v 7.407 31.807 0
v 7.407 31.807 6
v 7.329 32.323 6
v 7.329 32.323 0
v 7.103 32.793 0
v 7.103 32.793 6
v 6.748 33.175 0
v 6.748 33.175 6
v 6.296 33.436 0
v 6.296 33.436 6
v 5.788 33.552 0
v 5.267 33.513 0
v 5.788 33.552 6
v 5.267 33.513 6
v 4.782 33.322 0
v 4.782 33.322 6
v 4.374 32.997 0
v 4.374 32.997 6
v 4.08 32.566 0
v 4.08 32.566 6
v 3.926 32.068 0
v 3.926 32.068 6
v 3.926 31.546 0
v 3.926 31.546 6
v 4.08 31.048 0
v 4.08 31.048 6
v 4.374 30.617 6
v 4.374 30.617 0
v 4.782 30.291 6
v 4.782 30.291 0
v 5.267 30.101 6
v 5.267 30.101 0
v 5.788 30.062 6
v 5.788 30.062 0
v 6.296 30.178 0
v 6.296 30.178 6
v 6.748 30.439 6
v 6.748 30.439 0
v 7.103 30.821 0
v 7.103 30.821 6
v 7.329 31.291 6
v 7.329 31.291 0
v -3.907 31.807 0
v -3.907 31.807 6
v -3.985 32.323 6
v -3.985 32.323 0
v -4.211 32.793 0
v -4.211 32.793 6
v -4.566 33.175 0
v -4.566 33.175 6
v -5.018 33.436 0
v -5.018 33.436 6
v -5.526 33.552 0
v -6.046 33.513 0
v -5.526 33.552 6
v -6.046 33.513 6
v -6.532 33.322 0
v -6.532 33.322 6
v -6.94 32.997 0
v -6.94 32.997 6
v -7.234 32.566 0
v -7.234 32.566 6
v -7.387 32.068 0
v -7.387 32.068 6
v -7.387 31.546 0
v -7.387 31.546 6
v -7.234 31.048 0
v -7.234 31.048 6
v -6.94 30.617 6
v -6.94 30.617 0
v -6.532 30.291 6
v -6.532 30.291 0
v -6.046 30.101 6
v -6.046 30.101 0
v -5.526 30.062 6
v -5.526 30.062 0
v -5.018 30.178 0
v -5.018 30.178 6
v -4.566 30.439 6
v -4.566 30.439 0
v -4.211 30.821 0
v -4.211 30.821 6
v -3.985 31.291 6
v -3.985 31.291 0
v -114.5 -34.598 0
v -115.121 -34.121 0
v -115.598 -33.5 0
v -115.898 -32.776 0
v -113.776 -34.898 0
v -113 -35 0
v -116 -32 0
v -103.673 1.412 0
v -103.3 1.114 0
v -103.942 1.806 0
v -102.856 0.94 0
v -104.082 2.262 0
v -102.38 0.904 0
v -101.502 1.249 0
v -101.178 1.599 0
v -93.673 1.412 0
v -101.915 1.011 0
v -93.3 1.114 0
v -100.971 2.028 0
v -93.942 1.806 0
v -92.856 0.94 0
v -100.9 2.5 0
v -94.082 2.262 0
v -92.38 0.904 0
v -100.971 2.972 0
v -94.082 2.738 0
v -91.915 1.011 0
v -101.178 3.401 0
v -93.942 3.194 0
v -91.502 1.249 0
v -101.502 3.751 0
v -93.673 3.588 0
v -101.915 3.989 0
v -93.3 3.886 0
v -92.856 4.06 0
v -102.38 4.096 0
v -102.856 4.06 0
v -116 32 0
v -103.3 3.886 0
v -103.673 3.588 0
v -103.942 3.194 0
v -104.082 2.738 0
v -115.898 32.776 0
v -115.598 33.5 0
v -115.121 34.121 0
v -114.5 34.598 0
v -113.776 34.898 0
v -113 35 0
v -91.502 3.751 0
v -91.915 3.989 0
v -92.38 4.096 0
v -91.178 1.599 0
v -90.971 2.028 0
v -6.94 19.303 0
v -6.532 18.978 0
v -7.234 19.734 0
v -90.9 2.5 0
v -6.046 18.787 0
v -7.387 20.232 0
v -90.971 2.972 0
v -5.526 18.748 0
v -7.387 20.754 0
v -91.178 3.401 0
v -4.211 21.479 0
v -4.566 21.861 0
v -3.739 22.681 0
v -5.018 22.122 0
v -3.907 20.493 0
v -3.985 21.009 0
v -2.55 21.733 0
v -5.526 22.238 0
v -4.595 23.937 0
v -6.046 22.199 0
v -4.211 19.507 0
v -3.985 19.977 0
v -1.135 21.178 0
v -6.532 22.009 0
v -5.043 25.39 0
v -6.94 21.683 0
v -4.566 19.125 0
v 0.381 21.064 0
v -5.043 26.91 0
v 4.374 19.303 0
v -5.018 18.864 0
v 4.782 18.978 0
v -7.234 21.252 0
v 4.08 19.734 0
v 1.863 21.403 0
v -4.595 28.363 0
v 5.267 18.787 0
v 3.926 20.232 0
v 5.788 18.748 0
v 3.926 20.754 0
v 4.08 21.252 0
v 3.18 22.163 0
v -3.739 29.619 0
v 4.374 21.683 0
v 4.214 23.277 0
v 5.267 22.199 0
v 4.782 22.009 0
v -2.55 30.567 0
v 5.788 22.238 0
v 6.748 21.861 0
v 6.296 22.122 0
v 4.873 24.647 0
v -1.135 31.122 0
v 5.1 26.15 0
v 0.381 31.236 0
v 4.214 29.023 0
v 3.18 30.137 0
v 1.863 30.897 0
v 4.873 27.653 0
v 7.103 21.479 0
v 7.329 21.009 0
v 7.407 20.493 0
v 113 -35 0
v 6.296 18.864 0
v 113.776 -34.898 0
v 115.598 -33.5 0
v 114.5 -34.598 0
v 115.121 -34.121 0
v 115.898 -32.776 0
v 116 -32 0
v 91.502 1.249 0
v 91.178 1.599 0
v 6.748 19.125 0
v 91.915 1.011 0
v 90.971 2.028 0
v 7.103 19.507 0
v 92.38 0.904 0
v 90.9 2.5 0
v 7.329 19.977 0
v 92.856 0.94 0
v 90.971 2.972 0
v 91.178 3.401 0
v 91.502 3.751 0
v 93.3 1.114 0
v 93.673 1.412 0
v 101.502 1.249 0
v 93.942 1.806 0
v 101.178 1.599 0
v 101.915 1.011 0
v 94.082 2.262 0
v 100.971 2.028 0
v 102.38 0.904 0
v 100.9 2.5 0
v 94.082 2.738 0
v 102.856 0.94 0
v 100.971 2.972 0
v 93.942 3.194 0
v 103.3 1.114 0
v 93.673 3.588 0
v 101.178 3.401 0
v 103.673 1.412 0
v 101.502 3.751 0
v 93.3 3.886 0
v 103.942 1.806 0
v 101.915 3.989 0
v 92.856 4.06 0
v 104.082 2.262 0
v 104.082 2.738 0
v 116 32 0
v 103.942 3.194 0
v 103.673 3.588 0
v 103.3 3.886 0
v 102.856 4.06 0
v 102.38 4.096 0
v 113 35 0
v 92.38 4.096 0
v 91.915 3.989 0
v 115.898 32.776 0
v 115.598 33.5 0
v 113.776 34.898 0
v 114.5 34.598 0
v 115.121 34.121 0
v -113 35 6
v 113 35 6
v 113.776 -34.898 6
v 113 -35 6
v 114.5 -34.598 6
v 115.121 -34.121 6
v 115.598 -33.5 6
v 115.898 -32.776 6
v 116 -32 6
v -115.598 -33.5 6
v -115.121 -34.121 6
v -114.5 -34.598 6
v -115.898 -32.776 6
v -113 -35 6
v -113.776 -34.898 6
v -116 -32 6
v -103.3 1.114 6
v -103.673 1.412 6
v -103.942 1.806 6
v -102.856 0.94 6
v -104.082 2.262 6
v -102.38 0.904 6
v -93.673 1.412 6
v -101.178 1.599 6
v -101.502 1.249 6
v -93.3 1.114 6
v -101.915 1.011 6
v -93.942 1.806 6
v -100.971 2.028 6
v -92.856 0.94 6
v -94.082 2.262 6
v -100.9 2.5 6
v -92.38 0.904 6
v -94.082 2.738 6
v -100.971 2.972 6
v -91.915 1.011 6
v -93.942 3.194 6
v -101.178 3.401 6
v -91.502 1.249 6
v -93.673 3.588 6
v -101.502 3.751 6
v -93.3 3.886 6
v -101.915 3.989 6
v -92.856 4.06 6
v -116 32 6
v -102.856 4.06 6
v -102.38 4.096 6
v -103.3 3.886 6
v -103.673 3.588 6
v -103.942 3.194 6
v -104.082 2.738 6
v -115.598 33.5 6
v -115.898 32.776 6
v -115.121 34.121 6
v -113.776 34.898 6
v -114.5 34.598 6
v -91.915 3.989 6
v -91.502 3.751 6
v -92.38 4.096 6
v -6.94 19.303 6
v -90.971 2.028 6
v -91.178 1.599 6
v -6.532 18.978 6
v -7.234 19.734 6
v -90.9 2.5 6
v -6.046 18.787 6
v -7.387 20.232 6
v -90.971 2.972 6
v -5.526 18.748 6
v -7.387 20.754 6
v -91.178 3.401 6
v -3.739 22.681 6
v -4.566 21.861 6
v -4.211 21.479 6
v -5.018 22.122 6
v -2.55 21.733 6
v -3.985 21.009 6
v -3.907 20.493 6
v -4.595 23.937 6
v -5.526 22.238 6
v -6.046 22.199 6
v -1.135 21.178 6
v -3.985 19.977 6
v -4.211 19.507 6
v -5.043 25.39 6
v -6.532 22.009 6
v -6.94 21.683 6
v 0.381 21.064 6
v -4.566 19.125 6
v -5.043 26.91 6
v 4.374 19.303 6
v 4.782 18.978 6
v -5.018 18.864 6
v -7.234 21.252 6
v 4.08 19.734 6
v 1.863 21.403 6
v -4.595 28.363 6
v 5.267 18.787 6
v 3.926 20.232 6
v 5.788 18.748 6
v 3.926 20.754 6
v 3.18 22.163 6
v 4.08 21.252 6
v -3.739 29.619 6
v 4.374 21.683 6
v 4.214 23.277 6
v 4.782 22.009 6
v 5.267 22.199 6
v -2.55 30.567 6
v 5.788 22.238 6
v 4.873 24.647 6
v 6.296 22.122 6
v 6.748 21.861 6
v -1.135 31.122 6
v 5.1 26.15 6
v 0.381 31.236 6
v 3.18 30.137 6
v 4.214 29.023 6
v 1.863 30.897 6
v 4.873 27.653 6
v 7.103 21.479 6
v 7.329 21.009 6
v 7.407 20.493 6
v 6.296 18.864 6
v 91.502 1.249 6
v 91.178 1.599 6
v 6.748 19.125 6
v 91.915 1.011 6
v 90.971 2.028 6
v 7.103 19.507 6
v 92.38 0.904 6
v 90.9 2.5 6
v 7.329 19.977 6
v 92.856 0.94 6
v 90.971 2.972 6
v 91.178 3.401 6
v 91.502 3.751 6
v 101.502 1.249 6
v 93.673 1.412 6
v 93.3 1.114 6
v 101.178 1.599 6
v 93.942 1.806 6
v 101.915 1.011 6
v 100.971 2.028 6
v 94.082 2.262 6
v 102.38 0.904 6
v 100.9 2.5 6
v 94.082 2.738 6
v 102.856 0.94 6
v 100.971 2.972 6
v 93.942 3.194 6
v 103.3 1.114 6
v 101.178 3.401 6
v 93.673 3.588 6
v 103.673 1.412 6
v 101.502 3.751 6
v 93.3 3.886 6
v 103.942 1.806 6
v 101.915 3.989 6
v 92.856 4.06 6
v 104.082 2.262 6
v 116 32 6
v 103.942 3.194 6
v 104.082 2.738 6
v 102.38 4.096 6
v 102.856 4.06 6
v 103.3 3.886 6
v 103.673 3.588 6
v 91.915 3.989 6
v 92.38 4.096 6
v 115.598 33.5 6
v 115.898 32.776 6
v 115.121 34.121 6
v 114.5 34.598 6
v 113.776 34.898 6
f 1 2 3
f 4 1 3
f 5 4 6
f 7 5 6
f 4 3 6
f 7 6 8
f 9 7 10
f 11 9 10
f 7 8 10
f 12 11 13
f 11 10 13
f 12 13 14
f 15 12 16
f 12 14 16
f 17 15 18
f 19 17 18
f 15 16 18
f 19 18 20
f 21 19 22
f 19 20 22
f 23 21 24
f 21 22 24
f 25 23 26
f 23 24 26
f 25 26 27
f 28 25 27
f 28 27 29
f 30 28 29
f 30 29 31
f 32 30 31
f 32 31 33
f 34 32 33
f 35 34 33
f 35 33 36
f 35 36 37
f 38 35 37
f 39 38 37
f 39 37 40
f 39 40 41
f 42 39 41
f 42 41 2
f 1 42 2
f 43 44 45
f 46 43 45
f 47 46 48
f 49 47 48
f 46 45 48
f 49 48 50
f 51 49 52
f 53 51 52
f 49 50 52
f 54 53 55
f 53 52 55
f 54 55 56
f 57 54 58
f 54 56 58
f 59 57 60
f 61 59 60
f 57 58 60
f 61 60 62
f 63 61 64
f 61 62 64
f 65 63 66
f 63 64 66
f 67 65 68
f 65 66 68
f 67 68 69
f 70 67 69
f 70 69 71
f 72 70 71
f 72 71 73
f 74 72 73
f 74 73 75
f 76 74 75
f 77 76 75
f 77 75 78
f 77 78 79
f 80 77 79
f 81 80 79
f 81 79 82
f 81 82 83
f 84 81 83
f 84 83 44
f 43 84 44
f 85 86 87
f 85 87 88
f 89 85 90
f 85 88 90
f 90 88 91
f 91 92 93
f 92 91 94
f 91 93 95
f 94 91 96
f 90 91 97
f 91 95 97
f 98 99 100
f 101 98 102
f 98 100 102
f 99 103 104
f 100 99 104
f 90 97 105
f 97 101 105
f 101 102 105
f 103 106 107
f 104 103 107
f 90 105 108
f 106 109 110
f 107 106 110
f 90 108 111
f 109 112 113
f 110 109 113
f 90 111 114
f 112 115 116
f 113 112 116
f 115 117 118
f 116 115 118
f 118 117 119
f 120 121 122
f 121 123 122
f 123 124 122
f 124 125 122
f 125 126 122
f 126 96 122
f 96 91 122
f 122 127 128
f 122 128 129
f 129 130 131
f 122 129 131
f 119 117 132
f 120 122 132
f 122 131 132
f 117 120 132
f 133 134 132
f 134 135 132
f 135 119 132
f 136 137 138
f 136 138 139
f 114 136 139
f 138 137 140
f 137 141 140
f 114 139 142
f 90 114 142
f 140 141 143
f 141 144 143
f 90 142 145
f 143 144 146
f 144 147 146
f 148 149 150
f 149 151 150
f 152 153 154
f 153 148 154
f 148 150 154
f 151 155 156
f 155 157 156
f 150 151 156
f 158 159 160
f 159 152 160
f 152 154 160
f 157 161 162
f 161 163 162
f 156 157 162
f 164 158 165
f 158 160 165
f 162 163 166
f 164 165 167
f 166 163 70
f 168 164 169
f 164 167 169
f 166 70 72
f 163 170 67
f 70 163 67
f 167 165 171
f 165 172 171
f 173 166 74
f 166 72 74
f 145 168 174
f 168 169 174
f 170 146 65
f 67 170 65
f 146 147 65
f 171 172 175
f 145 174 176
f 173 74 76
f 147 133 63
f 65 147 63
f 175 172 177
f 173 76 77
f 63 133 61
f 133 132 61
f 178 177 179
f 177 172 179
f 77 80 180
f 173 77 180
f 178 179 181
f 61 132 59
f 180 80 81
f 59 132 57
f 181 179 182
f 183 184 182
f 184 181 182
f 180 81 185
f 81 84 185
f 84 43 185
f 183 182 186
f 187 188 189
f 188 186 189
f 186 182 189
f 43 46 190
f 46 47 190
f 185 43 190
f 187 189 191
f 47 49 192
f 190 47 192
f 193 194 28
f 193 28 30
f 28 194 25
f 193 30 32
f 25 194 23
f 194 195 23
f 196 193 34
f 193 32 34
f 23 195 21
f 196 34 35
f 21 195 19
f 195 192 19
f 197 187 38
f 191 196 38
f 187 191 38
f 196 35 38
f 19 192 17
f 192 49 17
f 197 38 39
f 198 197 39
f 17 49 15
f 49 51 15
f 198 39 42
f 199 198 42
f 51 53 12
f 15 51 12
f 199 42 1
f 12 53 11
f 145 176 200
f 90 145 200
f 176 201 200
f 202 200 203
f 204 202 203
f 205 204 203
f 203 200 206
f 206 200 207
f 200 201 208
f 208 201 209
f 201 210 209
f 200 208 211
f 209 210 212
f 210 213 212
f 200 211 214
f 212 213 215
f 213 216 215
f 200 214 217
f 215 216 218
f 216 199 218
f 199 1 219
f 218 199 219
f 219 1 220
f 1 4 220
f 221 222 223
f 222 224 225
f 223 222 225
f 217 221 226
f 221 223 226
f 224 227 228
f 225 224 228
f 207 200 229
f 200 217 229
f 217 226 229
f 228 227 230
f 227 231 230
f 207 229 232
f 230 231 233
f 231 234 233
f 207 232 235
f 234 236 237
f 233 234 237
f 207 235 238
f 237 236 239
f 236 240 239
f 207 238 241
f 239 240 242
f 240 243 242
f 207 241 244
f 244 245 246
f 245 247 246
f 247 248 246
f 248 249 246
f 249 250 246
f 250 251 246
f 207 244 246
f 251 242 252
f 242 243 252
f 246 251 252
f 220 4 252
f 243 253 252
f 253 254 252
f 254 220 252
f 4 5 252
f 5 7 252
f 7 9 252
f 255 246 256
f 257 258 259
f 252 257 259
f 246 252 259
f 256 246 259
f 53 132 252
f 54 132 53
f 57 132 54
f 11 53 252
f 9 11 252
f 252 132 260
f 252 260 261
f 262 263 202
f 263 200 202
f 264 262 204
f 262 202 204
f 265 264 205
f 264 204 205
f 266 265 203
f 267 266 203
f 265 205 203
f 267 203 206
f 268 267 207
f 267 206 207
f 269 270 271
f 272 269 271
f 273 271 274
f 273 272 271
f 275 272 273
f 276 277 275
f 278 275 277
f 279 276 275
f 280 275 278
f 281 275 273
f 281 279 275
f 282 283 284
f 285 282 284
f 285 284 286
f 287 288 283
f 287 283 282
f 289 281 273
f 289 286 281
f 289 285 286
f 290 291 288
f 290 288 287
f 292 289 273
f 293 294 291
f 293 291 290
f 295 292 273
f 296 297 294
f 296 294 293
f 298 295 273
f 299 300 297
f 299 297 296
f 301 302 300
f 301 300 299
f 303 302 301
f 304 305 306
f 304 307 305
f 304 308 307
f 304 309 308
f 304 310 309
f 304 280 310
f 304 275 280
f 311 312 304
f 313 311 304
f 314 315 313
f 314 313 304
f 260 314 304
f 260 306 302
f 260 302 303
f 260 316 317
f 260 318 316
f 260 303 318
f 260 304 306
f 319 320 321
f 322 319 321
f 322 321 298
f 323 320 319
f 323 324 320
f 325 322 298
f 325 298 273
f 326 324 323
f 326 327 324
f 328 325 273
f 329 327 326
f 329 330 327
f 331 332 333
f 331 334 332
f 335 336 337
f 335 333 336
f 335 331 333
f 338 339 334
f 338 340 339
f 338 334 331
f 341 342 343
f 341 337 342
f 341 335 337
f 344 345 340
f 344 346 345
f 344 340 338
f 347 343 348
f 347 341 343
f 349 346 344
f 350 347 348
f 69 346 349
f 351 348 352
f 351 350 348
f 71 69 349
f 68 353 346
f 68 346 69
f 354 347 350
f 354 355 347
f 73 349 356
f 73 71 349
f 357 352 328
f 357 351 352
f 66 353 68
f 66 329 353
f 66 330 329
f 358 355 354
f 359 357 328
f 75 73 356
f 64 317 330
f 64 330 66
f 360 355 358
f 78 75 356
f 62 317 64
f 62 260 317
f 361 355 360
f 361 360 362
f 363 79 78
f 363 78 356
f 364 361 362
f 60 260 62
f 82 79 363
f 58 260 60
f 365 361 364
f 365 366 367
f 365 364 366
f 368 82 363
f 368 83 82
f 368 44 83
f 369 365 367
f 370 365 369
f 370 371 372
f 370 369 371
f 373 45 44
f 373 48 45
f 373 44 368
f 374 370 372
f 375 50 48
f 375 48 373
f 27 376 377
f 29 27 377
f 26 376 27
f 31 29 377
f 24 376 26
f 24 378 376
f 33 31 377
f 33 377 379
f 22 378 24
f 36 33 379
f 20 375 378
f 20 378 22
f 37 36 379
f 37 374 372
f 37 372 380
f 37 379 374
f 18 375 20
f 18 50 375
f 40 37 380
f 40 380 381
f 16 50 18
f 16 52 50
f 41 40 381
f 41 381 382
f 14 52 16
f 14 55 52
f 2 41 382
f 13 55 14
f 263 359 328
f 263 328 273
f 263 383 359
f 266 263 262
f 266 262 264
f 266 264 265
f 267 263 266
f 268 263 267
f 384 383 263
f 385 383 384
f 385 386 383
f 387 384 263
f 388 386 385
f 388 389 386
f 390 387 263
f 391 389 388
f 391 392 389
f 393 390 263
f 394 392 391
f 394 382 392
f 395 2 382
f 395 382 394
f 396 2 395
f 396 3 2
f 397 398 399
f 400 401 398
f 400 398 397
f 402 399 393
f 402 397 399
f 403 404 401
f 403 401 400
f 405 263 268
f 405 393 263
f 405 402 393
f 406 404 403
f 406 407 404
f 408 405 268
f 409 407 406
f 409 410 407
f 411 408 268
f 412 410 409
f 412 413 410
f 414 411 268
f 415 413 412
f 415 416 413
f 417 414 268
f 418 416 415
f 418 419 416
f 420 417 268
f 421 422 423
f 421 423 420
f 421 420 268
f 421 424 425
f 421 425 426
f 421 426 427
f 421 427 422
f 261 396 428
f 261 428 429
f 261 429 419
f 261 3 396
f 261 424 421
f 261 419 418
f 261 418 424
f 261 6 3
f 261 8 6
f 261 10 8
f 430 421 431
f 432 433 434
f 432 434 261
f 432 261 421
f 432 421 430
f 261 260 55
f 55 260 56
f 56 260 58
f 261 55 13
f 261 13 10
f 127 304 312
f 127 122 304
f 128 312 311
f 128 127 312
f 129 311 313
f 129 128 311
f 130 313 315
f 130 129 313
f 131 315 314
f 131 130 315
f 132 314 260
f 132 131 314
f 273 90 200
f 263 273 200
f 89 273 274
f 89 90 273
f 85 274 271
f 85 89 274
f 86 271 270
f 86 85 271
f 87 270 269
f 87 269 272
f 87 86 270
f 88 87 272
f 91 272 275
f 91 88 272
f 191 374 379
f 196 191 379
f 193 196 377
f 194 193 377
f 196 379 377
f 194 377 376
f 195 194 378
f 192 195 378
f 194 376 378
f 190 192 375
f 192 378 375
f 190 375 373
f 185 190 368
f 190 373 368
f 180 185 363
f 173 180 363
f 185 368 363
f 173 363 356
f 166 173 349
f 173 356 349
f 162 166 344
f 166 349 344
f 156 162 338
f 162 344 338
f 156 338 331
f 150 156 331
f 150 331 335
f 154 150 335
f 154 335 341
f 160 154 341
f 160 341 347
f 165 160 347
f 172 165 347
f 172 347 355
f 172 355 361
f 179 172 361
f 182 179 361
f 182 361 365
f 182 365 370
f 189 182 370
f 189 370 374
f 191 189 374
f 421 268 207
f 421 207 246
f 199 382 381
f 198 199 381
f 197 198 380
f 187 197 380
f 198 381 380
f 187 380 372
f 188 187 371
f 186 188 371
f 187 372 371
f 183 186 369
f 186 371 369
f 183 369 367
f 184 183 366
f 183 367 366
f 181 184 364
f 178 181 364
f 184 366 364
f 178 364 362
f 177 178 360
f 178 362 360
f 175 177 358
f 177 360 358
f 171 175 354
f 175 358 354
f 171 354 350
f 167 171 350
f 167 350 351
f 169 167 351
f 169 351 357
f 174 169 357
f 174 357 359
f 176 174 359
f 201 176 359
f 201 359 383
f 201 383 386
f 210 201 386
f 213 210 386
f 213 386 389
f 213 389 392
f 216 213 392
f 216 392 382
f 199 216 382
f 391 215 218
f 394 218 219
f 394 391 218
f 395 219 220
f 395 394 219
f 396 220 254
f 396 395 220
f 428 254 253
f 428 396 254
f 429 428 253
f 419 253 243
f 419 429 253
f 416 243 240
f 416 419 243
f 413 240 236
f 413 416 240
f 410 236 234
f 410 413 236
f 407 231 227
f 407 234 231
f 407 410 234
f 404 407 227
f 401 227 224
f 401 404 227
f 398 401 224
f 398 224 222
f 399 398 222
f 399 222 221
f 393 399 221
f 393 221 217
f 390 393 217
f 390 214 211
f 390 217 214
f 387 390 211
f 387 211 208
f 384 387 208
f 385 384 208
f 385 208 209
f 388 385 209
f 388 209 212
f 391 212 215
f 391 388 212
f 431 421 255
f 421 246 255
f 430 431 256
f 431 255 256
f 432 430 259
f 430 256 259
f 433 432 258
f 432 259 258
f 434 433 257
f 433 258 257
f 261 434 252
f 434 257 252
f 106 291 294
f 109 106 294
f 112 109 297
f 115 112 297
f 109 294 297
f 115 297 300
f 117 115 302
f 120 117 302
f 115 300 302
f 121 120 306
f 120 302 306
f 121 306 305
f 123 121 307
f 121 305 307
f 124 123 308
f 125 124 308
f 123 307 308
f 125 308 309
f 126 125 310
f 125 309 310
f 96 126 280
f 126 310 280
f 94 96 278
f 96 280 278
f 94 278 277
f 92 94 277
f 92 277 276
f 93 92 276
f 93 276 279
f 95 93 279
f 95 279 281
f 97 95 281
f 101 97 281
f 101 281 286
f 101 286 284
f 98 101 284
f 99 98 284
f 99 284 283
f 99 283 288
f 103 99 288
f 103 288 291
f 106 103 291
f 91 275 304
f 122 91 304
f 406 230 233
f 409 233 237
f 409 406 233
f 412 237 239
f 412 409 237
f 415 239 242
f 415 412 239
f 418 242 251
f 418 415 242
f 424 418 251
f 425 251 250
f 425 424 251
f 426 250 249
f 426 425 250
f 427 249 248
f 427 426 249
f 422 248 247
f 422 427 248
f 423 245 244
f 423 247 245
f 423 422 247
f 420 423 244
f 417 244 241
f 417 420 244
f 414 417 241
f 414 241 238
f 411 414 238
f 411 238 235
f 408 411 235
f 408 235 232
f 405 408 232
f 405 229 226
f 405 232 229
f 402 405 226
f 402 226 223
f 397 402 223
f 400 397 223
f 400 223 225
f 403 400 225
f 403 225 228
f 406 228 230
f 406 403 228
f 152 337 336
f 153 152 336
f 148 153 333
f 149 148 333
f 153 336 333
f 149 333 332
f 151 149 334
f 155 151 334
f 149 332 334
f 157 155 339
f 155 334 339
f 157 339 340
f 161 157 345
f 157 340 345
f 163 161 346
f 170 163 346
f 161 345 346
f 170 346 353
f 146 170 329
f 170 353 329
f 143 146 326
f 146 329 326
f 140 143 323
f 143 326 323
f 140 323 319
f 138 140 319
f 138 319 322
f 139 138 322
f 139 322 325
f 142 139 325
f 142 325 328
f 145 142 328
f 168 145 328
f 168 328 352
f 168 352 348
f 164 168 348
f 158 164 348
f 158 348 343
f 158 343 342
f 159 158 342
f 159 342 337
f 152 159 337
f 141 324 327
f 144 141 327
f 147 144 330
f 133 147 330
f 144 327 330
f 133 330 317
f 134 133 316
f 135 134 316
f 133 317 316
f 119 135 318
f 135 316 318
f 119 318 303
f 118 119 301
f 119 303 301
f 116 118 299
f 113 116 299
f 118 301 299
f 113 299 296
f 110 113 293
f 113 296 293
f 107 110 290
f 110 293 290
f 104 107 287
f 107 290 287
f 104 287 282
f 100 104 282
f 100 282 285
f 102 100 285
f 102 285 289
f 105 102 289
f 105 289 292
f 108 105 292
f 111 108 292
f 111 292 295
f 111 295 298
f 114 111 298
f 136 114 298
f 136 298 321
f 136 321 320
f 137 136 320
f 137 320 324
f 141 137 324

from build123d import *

# Parameters (mm, degrees)
SKETCH_W        = 280
SKETCH_H        = 70
PAD_DEPTH       = 6
SKETCH001_R     = 5.1
SKETCH001_R_2   = 1.75
POCKET_DEPTH    = 6.001
SKETCH002_R     = 1.6
POCKET001_DEPTH = 583.360507
SKETCH003_W     = 24
SKETCH003_H     = 70
POCKET002_DEPTH = 6.001
FILLET_R        = 3


with BuildPart() as part:
    # Sketch → Pad (new body)
    with BuildSketch(Plane.XY):
        Rectangle(SKETCH_W, SKETCH_H)
    extrude(amount=PAD_DEPTH)

    # Sketch001 (on Face6 of Pad) → Pocket (cut, through all)
    with BuildSketch(Plane.XY.offset(6)):
        with Locations((0, 26.15)):
            Circle(SKETCH001_R)
        with Locations((-5.656854, 31.806854)):
            Circle(SKETCH001_R_2)
        with Locations((-5.656854, 20.493146)):
            Circle(SKETCH001_R_2)
        with Locations((5.656854, 31.806854)):
            Circle(SKETCH001_R_2)
        with Locations((5.656854, 20.493146)):
            Circle(SKETCH001_R_2)
    extrude(amount=-POCKET_DEPTH, mode=Mode.SUBTRACT)

    # Sketch002 (on Face5 of Pocket) → Pocket001 (cut, through all)
    with BuildSketch(Plane.XY.offset(6)):
        with Locations((-102.5, 2.5)):
            Circle(SKETCH002_R)
        with Locations((-92.5, 2.5)):
            Circle(SKETCH002_R)
    pocket001 = extrude(amount=-POCKET001_DEPTH, mode=Mode.SUBTRACT)

    # Mirrored: Pocket001 across Sketch002 V_Axis
    add(pocket001.mirror(Plane(origin=(0, 0, 6), x_dir=(0, 0, 1), z_dir=(1, 0, 0))), mode=Mode.SUBTRACT)

    # Sketch003 (on Face5 of Mirrored) → Pocket002 (cut, through all)
    with BuildSketch(Plane.XY.offset(6)):
        with Locations((-128, 0)):
            Rectangle(SKETCH003_W, SKETCH003_H)
        with Locations((128, 0)):
            Rectangle(SKETCH003_W, SKETCH003_H)
    extrude(amount=-POCKET002_DEPTH, mode=Mode.SUBTRACT)

    # Fillet
    fillet_edges = [part.edges().sort_by_distance(p)[0] for p in [
        (116, 35, 3),
        (116, -35, 3),
        (-116, 35, 3),
        (-116, -35, 3),
    ]]
    fillet(fillet_edges, radius=FILLET_R)


solid = part.part
